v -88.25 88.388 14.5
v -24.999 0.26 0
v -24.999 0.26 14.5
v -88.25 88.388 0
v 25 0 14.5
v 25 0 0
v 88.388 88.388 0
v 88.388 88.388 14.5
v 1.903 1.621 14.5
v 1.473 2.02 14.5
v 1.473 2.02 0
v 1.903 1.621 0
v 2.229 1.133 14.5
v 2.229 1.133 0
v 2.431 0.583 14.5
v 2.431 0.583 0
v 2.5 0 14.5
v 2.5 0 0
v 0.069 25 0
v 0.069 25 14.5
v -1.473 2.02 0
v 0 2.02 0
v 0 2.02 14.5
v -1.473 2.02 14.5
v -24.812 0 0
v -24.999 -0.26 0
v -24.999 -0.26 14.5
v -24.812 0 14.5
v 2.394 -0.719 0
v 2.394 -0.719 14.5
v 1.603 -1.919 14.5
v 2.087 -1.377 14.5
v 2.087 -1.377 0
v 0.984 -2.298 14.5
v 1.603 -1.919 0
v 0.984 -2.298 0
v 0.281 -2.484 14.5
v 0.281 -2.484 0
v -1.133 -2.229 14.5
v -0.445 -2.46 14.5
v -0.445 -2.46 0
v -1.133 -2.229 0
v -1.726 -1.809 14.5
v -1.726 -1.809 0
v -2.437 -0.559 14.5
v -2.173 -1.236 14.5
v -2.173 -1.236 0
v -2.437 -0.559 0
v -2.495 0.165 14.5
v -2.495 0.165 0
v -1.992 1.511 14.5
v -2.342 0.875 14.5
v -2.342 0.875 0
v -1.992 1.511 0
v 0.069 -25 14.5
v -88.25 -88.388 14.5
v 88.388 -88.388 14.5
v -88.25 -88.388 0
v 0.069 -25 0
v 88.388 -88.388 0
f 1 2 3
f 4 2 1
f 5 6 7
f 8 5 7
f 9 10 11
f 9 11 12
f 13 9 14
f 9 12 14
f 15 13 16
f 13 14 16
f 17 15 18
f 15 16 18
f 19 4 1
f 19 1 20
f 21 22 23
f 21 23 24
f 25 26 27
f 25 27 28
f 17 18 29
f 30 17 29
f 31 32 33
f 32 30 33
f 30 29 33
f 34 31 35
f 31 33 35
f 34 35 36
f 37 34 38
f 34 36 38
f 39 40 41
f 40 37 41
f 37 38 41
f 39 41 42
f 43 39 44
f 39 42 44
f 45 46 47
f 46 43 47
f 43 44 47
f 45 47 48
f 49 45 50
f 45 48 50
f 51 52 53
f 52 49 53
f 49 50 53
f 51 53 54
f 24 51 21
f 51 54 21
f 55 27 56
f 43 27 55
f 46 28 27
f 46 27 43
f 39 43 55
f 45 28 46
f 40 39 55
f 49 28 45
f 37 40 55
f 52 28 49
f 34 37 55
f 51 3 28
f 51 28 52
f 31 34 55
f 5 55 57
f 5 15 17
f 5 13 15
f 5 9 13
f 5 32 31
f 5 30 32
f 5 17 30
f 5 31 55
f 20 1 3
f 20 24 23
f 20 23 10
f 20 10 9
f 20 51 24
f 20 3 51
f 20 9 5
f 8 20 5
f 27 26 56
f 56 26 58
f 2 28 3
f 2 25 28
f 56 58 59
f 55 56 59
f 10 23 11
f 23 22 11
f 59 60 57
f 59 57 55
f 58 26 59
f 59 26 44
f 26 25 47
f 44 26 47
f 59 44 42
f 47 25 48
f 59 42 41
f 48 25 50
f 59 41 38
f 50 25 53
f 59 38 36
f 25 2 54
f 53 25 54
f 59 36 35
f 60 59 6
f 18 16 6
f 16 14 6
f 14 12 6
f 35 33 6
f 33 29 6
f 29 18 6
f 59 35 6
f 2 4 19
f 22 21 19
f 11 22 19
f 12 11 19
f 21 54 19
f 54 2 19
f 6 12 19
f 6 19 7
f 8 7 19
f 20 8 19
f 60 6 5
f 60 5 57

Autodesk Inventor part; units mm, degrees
ref_plane "YZ Plane" through (0, 0, 0) normal (1, 0, 0) x (0, 1, 0)
ref_plane "XZ Plane" through (0, 0, 0) normal (0, 1, 0) x (-1, 0, 0)
ref_plane "XY Plane" through (0, 0, 0) normal (0, 0, 1) x (1, 0, 0)
sketch "Sketch1" plane through (0, 0, 0) normal (0, 0, 1) x (1, 0, 0)
  arc A0 (-1.473, 2.02) -> (1.473, 2.02) centre (0, 0) ccw
  line L0 (0, 2.5) -> (0, 2.02)
  line L1 (0, 2.02) -> (1.473, 2.02)
  line L2 (0, 2.02) -> (-1.473, 2.02)
  line L3 (0, 0) -> (125, 0) construction
  line L4 (88.3883, 88.3883) -> (0.0691, 24.9999)
  line L5 (-88.2502, 88.3883) -> (0.0691, 24.9999)
  line L6 (0.0691, 24.9999) -> (-88.2502, 88.3883)
  line L7 (88.3883, 88.3883) -> (0.0691, 24.9999)
  line L8 (25, 0) -> (88.3883, 88.3883)
  line L9 (-24.9987, 0.2597) -> (-88.2502, 88.3883)
  line L10 (0, 0) -> (7.0052, 0)
  line L11 (88.3883, -88.3883) -> (0.0691, -24.9999)
  line L12 (-88.2502, -88.3883) -> (0.0691, -24.9999)
  line L13 (25, 0) -> (88.3883, -88.3883)
  line L14 (-24.9987, -0.2597) -> (-88.2502, -88.3883)
  line L15 (0.0691, -24.9999) -> (-88.2502, -88.3883)
  line L16 (-88.2502, -88.3883) -> (-24.9987, -0.2597)
  line L17 (88.3883, -88.3883) -> (0.0691, -24.9999)
  line L18 (88.3883, -88.3883) -> (25, 0)
  line L19 (88.3883, -88.3883) -> (0.0691, -24.9999)
  line L20 (0.0691, -24.9999) -> (-88.2502, -88.3883)
  line L21 (-88.2502, -88.3883) -> (-24.9987, -0.2597)
  line L22 (-24.9987, -0.2597) -> (-24.8122, 0)
  line L23 (-24.8122, 0) -> (-24.9987, 0.2597)
  dimension "d0" = 5
  dimension "d1" = 0.48
  dimension "d3" = 125
extrude "Extrusion1" add sketch "Sketch1" along normal blind 14.5
sketch "Sketch2" plane through (0, 0, 14.5) normal (0, 0, 1) x (1, 0, 0)
  line L0 (0.0691, 24.9999) -> (-88.2502, 88.3883) projected
  line L1 (0.0691, 24.9999) -> (-88.2502, 88.3883)
  line L2 (88.3883, 88.3883) -> (0.0691, 24.9999) projected
  line L3 (-88.2502, 88.3883) -> (88.3883, 88.3883)
  line L4 (88.3883, 88.3883) -> (0.0691, 24.9999)
  point P0 (0, 0)
properties part number "Dispensing Gear"
